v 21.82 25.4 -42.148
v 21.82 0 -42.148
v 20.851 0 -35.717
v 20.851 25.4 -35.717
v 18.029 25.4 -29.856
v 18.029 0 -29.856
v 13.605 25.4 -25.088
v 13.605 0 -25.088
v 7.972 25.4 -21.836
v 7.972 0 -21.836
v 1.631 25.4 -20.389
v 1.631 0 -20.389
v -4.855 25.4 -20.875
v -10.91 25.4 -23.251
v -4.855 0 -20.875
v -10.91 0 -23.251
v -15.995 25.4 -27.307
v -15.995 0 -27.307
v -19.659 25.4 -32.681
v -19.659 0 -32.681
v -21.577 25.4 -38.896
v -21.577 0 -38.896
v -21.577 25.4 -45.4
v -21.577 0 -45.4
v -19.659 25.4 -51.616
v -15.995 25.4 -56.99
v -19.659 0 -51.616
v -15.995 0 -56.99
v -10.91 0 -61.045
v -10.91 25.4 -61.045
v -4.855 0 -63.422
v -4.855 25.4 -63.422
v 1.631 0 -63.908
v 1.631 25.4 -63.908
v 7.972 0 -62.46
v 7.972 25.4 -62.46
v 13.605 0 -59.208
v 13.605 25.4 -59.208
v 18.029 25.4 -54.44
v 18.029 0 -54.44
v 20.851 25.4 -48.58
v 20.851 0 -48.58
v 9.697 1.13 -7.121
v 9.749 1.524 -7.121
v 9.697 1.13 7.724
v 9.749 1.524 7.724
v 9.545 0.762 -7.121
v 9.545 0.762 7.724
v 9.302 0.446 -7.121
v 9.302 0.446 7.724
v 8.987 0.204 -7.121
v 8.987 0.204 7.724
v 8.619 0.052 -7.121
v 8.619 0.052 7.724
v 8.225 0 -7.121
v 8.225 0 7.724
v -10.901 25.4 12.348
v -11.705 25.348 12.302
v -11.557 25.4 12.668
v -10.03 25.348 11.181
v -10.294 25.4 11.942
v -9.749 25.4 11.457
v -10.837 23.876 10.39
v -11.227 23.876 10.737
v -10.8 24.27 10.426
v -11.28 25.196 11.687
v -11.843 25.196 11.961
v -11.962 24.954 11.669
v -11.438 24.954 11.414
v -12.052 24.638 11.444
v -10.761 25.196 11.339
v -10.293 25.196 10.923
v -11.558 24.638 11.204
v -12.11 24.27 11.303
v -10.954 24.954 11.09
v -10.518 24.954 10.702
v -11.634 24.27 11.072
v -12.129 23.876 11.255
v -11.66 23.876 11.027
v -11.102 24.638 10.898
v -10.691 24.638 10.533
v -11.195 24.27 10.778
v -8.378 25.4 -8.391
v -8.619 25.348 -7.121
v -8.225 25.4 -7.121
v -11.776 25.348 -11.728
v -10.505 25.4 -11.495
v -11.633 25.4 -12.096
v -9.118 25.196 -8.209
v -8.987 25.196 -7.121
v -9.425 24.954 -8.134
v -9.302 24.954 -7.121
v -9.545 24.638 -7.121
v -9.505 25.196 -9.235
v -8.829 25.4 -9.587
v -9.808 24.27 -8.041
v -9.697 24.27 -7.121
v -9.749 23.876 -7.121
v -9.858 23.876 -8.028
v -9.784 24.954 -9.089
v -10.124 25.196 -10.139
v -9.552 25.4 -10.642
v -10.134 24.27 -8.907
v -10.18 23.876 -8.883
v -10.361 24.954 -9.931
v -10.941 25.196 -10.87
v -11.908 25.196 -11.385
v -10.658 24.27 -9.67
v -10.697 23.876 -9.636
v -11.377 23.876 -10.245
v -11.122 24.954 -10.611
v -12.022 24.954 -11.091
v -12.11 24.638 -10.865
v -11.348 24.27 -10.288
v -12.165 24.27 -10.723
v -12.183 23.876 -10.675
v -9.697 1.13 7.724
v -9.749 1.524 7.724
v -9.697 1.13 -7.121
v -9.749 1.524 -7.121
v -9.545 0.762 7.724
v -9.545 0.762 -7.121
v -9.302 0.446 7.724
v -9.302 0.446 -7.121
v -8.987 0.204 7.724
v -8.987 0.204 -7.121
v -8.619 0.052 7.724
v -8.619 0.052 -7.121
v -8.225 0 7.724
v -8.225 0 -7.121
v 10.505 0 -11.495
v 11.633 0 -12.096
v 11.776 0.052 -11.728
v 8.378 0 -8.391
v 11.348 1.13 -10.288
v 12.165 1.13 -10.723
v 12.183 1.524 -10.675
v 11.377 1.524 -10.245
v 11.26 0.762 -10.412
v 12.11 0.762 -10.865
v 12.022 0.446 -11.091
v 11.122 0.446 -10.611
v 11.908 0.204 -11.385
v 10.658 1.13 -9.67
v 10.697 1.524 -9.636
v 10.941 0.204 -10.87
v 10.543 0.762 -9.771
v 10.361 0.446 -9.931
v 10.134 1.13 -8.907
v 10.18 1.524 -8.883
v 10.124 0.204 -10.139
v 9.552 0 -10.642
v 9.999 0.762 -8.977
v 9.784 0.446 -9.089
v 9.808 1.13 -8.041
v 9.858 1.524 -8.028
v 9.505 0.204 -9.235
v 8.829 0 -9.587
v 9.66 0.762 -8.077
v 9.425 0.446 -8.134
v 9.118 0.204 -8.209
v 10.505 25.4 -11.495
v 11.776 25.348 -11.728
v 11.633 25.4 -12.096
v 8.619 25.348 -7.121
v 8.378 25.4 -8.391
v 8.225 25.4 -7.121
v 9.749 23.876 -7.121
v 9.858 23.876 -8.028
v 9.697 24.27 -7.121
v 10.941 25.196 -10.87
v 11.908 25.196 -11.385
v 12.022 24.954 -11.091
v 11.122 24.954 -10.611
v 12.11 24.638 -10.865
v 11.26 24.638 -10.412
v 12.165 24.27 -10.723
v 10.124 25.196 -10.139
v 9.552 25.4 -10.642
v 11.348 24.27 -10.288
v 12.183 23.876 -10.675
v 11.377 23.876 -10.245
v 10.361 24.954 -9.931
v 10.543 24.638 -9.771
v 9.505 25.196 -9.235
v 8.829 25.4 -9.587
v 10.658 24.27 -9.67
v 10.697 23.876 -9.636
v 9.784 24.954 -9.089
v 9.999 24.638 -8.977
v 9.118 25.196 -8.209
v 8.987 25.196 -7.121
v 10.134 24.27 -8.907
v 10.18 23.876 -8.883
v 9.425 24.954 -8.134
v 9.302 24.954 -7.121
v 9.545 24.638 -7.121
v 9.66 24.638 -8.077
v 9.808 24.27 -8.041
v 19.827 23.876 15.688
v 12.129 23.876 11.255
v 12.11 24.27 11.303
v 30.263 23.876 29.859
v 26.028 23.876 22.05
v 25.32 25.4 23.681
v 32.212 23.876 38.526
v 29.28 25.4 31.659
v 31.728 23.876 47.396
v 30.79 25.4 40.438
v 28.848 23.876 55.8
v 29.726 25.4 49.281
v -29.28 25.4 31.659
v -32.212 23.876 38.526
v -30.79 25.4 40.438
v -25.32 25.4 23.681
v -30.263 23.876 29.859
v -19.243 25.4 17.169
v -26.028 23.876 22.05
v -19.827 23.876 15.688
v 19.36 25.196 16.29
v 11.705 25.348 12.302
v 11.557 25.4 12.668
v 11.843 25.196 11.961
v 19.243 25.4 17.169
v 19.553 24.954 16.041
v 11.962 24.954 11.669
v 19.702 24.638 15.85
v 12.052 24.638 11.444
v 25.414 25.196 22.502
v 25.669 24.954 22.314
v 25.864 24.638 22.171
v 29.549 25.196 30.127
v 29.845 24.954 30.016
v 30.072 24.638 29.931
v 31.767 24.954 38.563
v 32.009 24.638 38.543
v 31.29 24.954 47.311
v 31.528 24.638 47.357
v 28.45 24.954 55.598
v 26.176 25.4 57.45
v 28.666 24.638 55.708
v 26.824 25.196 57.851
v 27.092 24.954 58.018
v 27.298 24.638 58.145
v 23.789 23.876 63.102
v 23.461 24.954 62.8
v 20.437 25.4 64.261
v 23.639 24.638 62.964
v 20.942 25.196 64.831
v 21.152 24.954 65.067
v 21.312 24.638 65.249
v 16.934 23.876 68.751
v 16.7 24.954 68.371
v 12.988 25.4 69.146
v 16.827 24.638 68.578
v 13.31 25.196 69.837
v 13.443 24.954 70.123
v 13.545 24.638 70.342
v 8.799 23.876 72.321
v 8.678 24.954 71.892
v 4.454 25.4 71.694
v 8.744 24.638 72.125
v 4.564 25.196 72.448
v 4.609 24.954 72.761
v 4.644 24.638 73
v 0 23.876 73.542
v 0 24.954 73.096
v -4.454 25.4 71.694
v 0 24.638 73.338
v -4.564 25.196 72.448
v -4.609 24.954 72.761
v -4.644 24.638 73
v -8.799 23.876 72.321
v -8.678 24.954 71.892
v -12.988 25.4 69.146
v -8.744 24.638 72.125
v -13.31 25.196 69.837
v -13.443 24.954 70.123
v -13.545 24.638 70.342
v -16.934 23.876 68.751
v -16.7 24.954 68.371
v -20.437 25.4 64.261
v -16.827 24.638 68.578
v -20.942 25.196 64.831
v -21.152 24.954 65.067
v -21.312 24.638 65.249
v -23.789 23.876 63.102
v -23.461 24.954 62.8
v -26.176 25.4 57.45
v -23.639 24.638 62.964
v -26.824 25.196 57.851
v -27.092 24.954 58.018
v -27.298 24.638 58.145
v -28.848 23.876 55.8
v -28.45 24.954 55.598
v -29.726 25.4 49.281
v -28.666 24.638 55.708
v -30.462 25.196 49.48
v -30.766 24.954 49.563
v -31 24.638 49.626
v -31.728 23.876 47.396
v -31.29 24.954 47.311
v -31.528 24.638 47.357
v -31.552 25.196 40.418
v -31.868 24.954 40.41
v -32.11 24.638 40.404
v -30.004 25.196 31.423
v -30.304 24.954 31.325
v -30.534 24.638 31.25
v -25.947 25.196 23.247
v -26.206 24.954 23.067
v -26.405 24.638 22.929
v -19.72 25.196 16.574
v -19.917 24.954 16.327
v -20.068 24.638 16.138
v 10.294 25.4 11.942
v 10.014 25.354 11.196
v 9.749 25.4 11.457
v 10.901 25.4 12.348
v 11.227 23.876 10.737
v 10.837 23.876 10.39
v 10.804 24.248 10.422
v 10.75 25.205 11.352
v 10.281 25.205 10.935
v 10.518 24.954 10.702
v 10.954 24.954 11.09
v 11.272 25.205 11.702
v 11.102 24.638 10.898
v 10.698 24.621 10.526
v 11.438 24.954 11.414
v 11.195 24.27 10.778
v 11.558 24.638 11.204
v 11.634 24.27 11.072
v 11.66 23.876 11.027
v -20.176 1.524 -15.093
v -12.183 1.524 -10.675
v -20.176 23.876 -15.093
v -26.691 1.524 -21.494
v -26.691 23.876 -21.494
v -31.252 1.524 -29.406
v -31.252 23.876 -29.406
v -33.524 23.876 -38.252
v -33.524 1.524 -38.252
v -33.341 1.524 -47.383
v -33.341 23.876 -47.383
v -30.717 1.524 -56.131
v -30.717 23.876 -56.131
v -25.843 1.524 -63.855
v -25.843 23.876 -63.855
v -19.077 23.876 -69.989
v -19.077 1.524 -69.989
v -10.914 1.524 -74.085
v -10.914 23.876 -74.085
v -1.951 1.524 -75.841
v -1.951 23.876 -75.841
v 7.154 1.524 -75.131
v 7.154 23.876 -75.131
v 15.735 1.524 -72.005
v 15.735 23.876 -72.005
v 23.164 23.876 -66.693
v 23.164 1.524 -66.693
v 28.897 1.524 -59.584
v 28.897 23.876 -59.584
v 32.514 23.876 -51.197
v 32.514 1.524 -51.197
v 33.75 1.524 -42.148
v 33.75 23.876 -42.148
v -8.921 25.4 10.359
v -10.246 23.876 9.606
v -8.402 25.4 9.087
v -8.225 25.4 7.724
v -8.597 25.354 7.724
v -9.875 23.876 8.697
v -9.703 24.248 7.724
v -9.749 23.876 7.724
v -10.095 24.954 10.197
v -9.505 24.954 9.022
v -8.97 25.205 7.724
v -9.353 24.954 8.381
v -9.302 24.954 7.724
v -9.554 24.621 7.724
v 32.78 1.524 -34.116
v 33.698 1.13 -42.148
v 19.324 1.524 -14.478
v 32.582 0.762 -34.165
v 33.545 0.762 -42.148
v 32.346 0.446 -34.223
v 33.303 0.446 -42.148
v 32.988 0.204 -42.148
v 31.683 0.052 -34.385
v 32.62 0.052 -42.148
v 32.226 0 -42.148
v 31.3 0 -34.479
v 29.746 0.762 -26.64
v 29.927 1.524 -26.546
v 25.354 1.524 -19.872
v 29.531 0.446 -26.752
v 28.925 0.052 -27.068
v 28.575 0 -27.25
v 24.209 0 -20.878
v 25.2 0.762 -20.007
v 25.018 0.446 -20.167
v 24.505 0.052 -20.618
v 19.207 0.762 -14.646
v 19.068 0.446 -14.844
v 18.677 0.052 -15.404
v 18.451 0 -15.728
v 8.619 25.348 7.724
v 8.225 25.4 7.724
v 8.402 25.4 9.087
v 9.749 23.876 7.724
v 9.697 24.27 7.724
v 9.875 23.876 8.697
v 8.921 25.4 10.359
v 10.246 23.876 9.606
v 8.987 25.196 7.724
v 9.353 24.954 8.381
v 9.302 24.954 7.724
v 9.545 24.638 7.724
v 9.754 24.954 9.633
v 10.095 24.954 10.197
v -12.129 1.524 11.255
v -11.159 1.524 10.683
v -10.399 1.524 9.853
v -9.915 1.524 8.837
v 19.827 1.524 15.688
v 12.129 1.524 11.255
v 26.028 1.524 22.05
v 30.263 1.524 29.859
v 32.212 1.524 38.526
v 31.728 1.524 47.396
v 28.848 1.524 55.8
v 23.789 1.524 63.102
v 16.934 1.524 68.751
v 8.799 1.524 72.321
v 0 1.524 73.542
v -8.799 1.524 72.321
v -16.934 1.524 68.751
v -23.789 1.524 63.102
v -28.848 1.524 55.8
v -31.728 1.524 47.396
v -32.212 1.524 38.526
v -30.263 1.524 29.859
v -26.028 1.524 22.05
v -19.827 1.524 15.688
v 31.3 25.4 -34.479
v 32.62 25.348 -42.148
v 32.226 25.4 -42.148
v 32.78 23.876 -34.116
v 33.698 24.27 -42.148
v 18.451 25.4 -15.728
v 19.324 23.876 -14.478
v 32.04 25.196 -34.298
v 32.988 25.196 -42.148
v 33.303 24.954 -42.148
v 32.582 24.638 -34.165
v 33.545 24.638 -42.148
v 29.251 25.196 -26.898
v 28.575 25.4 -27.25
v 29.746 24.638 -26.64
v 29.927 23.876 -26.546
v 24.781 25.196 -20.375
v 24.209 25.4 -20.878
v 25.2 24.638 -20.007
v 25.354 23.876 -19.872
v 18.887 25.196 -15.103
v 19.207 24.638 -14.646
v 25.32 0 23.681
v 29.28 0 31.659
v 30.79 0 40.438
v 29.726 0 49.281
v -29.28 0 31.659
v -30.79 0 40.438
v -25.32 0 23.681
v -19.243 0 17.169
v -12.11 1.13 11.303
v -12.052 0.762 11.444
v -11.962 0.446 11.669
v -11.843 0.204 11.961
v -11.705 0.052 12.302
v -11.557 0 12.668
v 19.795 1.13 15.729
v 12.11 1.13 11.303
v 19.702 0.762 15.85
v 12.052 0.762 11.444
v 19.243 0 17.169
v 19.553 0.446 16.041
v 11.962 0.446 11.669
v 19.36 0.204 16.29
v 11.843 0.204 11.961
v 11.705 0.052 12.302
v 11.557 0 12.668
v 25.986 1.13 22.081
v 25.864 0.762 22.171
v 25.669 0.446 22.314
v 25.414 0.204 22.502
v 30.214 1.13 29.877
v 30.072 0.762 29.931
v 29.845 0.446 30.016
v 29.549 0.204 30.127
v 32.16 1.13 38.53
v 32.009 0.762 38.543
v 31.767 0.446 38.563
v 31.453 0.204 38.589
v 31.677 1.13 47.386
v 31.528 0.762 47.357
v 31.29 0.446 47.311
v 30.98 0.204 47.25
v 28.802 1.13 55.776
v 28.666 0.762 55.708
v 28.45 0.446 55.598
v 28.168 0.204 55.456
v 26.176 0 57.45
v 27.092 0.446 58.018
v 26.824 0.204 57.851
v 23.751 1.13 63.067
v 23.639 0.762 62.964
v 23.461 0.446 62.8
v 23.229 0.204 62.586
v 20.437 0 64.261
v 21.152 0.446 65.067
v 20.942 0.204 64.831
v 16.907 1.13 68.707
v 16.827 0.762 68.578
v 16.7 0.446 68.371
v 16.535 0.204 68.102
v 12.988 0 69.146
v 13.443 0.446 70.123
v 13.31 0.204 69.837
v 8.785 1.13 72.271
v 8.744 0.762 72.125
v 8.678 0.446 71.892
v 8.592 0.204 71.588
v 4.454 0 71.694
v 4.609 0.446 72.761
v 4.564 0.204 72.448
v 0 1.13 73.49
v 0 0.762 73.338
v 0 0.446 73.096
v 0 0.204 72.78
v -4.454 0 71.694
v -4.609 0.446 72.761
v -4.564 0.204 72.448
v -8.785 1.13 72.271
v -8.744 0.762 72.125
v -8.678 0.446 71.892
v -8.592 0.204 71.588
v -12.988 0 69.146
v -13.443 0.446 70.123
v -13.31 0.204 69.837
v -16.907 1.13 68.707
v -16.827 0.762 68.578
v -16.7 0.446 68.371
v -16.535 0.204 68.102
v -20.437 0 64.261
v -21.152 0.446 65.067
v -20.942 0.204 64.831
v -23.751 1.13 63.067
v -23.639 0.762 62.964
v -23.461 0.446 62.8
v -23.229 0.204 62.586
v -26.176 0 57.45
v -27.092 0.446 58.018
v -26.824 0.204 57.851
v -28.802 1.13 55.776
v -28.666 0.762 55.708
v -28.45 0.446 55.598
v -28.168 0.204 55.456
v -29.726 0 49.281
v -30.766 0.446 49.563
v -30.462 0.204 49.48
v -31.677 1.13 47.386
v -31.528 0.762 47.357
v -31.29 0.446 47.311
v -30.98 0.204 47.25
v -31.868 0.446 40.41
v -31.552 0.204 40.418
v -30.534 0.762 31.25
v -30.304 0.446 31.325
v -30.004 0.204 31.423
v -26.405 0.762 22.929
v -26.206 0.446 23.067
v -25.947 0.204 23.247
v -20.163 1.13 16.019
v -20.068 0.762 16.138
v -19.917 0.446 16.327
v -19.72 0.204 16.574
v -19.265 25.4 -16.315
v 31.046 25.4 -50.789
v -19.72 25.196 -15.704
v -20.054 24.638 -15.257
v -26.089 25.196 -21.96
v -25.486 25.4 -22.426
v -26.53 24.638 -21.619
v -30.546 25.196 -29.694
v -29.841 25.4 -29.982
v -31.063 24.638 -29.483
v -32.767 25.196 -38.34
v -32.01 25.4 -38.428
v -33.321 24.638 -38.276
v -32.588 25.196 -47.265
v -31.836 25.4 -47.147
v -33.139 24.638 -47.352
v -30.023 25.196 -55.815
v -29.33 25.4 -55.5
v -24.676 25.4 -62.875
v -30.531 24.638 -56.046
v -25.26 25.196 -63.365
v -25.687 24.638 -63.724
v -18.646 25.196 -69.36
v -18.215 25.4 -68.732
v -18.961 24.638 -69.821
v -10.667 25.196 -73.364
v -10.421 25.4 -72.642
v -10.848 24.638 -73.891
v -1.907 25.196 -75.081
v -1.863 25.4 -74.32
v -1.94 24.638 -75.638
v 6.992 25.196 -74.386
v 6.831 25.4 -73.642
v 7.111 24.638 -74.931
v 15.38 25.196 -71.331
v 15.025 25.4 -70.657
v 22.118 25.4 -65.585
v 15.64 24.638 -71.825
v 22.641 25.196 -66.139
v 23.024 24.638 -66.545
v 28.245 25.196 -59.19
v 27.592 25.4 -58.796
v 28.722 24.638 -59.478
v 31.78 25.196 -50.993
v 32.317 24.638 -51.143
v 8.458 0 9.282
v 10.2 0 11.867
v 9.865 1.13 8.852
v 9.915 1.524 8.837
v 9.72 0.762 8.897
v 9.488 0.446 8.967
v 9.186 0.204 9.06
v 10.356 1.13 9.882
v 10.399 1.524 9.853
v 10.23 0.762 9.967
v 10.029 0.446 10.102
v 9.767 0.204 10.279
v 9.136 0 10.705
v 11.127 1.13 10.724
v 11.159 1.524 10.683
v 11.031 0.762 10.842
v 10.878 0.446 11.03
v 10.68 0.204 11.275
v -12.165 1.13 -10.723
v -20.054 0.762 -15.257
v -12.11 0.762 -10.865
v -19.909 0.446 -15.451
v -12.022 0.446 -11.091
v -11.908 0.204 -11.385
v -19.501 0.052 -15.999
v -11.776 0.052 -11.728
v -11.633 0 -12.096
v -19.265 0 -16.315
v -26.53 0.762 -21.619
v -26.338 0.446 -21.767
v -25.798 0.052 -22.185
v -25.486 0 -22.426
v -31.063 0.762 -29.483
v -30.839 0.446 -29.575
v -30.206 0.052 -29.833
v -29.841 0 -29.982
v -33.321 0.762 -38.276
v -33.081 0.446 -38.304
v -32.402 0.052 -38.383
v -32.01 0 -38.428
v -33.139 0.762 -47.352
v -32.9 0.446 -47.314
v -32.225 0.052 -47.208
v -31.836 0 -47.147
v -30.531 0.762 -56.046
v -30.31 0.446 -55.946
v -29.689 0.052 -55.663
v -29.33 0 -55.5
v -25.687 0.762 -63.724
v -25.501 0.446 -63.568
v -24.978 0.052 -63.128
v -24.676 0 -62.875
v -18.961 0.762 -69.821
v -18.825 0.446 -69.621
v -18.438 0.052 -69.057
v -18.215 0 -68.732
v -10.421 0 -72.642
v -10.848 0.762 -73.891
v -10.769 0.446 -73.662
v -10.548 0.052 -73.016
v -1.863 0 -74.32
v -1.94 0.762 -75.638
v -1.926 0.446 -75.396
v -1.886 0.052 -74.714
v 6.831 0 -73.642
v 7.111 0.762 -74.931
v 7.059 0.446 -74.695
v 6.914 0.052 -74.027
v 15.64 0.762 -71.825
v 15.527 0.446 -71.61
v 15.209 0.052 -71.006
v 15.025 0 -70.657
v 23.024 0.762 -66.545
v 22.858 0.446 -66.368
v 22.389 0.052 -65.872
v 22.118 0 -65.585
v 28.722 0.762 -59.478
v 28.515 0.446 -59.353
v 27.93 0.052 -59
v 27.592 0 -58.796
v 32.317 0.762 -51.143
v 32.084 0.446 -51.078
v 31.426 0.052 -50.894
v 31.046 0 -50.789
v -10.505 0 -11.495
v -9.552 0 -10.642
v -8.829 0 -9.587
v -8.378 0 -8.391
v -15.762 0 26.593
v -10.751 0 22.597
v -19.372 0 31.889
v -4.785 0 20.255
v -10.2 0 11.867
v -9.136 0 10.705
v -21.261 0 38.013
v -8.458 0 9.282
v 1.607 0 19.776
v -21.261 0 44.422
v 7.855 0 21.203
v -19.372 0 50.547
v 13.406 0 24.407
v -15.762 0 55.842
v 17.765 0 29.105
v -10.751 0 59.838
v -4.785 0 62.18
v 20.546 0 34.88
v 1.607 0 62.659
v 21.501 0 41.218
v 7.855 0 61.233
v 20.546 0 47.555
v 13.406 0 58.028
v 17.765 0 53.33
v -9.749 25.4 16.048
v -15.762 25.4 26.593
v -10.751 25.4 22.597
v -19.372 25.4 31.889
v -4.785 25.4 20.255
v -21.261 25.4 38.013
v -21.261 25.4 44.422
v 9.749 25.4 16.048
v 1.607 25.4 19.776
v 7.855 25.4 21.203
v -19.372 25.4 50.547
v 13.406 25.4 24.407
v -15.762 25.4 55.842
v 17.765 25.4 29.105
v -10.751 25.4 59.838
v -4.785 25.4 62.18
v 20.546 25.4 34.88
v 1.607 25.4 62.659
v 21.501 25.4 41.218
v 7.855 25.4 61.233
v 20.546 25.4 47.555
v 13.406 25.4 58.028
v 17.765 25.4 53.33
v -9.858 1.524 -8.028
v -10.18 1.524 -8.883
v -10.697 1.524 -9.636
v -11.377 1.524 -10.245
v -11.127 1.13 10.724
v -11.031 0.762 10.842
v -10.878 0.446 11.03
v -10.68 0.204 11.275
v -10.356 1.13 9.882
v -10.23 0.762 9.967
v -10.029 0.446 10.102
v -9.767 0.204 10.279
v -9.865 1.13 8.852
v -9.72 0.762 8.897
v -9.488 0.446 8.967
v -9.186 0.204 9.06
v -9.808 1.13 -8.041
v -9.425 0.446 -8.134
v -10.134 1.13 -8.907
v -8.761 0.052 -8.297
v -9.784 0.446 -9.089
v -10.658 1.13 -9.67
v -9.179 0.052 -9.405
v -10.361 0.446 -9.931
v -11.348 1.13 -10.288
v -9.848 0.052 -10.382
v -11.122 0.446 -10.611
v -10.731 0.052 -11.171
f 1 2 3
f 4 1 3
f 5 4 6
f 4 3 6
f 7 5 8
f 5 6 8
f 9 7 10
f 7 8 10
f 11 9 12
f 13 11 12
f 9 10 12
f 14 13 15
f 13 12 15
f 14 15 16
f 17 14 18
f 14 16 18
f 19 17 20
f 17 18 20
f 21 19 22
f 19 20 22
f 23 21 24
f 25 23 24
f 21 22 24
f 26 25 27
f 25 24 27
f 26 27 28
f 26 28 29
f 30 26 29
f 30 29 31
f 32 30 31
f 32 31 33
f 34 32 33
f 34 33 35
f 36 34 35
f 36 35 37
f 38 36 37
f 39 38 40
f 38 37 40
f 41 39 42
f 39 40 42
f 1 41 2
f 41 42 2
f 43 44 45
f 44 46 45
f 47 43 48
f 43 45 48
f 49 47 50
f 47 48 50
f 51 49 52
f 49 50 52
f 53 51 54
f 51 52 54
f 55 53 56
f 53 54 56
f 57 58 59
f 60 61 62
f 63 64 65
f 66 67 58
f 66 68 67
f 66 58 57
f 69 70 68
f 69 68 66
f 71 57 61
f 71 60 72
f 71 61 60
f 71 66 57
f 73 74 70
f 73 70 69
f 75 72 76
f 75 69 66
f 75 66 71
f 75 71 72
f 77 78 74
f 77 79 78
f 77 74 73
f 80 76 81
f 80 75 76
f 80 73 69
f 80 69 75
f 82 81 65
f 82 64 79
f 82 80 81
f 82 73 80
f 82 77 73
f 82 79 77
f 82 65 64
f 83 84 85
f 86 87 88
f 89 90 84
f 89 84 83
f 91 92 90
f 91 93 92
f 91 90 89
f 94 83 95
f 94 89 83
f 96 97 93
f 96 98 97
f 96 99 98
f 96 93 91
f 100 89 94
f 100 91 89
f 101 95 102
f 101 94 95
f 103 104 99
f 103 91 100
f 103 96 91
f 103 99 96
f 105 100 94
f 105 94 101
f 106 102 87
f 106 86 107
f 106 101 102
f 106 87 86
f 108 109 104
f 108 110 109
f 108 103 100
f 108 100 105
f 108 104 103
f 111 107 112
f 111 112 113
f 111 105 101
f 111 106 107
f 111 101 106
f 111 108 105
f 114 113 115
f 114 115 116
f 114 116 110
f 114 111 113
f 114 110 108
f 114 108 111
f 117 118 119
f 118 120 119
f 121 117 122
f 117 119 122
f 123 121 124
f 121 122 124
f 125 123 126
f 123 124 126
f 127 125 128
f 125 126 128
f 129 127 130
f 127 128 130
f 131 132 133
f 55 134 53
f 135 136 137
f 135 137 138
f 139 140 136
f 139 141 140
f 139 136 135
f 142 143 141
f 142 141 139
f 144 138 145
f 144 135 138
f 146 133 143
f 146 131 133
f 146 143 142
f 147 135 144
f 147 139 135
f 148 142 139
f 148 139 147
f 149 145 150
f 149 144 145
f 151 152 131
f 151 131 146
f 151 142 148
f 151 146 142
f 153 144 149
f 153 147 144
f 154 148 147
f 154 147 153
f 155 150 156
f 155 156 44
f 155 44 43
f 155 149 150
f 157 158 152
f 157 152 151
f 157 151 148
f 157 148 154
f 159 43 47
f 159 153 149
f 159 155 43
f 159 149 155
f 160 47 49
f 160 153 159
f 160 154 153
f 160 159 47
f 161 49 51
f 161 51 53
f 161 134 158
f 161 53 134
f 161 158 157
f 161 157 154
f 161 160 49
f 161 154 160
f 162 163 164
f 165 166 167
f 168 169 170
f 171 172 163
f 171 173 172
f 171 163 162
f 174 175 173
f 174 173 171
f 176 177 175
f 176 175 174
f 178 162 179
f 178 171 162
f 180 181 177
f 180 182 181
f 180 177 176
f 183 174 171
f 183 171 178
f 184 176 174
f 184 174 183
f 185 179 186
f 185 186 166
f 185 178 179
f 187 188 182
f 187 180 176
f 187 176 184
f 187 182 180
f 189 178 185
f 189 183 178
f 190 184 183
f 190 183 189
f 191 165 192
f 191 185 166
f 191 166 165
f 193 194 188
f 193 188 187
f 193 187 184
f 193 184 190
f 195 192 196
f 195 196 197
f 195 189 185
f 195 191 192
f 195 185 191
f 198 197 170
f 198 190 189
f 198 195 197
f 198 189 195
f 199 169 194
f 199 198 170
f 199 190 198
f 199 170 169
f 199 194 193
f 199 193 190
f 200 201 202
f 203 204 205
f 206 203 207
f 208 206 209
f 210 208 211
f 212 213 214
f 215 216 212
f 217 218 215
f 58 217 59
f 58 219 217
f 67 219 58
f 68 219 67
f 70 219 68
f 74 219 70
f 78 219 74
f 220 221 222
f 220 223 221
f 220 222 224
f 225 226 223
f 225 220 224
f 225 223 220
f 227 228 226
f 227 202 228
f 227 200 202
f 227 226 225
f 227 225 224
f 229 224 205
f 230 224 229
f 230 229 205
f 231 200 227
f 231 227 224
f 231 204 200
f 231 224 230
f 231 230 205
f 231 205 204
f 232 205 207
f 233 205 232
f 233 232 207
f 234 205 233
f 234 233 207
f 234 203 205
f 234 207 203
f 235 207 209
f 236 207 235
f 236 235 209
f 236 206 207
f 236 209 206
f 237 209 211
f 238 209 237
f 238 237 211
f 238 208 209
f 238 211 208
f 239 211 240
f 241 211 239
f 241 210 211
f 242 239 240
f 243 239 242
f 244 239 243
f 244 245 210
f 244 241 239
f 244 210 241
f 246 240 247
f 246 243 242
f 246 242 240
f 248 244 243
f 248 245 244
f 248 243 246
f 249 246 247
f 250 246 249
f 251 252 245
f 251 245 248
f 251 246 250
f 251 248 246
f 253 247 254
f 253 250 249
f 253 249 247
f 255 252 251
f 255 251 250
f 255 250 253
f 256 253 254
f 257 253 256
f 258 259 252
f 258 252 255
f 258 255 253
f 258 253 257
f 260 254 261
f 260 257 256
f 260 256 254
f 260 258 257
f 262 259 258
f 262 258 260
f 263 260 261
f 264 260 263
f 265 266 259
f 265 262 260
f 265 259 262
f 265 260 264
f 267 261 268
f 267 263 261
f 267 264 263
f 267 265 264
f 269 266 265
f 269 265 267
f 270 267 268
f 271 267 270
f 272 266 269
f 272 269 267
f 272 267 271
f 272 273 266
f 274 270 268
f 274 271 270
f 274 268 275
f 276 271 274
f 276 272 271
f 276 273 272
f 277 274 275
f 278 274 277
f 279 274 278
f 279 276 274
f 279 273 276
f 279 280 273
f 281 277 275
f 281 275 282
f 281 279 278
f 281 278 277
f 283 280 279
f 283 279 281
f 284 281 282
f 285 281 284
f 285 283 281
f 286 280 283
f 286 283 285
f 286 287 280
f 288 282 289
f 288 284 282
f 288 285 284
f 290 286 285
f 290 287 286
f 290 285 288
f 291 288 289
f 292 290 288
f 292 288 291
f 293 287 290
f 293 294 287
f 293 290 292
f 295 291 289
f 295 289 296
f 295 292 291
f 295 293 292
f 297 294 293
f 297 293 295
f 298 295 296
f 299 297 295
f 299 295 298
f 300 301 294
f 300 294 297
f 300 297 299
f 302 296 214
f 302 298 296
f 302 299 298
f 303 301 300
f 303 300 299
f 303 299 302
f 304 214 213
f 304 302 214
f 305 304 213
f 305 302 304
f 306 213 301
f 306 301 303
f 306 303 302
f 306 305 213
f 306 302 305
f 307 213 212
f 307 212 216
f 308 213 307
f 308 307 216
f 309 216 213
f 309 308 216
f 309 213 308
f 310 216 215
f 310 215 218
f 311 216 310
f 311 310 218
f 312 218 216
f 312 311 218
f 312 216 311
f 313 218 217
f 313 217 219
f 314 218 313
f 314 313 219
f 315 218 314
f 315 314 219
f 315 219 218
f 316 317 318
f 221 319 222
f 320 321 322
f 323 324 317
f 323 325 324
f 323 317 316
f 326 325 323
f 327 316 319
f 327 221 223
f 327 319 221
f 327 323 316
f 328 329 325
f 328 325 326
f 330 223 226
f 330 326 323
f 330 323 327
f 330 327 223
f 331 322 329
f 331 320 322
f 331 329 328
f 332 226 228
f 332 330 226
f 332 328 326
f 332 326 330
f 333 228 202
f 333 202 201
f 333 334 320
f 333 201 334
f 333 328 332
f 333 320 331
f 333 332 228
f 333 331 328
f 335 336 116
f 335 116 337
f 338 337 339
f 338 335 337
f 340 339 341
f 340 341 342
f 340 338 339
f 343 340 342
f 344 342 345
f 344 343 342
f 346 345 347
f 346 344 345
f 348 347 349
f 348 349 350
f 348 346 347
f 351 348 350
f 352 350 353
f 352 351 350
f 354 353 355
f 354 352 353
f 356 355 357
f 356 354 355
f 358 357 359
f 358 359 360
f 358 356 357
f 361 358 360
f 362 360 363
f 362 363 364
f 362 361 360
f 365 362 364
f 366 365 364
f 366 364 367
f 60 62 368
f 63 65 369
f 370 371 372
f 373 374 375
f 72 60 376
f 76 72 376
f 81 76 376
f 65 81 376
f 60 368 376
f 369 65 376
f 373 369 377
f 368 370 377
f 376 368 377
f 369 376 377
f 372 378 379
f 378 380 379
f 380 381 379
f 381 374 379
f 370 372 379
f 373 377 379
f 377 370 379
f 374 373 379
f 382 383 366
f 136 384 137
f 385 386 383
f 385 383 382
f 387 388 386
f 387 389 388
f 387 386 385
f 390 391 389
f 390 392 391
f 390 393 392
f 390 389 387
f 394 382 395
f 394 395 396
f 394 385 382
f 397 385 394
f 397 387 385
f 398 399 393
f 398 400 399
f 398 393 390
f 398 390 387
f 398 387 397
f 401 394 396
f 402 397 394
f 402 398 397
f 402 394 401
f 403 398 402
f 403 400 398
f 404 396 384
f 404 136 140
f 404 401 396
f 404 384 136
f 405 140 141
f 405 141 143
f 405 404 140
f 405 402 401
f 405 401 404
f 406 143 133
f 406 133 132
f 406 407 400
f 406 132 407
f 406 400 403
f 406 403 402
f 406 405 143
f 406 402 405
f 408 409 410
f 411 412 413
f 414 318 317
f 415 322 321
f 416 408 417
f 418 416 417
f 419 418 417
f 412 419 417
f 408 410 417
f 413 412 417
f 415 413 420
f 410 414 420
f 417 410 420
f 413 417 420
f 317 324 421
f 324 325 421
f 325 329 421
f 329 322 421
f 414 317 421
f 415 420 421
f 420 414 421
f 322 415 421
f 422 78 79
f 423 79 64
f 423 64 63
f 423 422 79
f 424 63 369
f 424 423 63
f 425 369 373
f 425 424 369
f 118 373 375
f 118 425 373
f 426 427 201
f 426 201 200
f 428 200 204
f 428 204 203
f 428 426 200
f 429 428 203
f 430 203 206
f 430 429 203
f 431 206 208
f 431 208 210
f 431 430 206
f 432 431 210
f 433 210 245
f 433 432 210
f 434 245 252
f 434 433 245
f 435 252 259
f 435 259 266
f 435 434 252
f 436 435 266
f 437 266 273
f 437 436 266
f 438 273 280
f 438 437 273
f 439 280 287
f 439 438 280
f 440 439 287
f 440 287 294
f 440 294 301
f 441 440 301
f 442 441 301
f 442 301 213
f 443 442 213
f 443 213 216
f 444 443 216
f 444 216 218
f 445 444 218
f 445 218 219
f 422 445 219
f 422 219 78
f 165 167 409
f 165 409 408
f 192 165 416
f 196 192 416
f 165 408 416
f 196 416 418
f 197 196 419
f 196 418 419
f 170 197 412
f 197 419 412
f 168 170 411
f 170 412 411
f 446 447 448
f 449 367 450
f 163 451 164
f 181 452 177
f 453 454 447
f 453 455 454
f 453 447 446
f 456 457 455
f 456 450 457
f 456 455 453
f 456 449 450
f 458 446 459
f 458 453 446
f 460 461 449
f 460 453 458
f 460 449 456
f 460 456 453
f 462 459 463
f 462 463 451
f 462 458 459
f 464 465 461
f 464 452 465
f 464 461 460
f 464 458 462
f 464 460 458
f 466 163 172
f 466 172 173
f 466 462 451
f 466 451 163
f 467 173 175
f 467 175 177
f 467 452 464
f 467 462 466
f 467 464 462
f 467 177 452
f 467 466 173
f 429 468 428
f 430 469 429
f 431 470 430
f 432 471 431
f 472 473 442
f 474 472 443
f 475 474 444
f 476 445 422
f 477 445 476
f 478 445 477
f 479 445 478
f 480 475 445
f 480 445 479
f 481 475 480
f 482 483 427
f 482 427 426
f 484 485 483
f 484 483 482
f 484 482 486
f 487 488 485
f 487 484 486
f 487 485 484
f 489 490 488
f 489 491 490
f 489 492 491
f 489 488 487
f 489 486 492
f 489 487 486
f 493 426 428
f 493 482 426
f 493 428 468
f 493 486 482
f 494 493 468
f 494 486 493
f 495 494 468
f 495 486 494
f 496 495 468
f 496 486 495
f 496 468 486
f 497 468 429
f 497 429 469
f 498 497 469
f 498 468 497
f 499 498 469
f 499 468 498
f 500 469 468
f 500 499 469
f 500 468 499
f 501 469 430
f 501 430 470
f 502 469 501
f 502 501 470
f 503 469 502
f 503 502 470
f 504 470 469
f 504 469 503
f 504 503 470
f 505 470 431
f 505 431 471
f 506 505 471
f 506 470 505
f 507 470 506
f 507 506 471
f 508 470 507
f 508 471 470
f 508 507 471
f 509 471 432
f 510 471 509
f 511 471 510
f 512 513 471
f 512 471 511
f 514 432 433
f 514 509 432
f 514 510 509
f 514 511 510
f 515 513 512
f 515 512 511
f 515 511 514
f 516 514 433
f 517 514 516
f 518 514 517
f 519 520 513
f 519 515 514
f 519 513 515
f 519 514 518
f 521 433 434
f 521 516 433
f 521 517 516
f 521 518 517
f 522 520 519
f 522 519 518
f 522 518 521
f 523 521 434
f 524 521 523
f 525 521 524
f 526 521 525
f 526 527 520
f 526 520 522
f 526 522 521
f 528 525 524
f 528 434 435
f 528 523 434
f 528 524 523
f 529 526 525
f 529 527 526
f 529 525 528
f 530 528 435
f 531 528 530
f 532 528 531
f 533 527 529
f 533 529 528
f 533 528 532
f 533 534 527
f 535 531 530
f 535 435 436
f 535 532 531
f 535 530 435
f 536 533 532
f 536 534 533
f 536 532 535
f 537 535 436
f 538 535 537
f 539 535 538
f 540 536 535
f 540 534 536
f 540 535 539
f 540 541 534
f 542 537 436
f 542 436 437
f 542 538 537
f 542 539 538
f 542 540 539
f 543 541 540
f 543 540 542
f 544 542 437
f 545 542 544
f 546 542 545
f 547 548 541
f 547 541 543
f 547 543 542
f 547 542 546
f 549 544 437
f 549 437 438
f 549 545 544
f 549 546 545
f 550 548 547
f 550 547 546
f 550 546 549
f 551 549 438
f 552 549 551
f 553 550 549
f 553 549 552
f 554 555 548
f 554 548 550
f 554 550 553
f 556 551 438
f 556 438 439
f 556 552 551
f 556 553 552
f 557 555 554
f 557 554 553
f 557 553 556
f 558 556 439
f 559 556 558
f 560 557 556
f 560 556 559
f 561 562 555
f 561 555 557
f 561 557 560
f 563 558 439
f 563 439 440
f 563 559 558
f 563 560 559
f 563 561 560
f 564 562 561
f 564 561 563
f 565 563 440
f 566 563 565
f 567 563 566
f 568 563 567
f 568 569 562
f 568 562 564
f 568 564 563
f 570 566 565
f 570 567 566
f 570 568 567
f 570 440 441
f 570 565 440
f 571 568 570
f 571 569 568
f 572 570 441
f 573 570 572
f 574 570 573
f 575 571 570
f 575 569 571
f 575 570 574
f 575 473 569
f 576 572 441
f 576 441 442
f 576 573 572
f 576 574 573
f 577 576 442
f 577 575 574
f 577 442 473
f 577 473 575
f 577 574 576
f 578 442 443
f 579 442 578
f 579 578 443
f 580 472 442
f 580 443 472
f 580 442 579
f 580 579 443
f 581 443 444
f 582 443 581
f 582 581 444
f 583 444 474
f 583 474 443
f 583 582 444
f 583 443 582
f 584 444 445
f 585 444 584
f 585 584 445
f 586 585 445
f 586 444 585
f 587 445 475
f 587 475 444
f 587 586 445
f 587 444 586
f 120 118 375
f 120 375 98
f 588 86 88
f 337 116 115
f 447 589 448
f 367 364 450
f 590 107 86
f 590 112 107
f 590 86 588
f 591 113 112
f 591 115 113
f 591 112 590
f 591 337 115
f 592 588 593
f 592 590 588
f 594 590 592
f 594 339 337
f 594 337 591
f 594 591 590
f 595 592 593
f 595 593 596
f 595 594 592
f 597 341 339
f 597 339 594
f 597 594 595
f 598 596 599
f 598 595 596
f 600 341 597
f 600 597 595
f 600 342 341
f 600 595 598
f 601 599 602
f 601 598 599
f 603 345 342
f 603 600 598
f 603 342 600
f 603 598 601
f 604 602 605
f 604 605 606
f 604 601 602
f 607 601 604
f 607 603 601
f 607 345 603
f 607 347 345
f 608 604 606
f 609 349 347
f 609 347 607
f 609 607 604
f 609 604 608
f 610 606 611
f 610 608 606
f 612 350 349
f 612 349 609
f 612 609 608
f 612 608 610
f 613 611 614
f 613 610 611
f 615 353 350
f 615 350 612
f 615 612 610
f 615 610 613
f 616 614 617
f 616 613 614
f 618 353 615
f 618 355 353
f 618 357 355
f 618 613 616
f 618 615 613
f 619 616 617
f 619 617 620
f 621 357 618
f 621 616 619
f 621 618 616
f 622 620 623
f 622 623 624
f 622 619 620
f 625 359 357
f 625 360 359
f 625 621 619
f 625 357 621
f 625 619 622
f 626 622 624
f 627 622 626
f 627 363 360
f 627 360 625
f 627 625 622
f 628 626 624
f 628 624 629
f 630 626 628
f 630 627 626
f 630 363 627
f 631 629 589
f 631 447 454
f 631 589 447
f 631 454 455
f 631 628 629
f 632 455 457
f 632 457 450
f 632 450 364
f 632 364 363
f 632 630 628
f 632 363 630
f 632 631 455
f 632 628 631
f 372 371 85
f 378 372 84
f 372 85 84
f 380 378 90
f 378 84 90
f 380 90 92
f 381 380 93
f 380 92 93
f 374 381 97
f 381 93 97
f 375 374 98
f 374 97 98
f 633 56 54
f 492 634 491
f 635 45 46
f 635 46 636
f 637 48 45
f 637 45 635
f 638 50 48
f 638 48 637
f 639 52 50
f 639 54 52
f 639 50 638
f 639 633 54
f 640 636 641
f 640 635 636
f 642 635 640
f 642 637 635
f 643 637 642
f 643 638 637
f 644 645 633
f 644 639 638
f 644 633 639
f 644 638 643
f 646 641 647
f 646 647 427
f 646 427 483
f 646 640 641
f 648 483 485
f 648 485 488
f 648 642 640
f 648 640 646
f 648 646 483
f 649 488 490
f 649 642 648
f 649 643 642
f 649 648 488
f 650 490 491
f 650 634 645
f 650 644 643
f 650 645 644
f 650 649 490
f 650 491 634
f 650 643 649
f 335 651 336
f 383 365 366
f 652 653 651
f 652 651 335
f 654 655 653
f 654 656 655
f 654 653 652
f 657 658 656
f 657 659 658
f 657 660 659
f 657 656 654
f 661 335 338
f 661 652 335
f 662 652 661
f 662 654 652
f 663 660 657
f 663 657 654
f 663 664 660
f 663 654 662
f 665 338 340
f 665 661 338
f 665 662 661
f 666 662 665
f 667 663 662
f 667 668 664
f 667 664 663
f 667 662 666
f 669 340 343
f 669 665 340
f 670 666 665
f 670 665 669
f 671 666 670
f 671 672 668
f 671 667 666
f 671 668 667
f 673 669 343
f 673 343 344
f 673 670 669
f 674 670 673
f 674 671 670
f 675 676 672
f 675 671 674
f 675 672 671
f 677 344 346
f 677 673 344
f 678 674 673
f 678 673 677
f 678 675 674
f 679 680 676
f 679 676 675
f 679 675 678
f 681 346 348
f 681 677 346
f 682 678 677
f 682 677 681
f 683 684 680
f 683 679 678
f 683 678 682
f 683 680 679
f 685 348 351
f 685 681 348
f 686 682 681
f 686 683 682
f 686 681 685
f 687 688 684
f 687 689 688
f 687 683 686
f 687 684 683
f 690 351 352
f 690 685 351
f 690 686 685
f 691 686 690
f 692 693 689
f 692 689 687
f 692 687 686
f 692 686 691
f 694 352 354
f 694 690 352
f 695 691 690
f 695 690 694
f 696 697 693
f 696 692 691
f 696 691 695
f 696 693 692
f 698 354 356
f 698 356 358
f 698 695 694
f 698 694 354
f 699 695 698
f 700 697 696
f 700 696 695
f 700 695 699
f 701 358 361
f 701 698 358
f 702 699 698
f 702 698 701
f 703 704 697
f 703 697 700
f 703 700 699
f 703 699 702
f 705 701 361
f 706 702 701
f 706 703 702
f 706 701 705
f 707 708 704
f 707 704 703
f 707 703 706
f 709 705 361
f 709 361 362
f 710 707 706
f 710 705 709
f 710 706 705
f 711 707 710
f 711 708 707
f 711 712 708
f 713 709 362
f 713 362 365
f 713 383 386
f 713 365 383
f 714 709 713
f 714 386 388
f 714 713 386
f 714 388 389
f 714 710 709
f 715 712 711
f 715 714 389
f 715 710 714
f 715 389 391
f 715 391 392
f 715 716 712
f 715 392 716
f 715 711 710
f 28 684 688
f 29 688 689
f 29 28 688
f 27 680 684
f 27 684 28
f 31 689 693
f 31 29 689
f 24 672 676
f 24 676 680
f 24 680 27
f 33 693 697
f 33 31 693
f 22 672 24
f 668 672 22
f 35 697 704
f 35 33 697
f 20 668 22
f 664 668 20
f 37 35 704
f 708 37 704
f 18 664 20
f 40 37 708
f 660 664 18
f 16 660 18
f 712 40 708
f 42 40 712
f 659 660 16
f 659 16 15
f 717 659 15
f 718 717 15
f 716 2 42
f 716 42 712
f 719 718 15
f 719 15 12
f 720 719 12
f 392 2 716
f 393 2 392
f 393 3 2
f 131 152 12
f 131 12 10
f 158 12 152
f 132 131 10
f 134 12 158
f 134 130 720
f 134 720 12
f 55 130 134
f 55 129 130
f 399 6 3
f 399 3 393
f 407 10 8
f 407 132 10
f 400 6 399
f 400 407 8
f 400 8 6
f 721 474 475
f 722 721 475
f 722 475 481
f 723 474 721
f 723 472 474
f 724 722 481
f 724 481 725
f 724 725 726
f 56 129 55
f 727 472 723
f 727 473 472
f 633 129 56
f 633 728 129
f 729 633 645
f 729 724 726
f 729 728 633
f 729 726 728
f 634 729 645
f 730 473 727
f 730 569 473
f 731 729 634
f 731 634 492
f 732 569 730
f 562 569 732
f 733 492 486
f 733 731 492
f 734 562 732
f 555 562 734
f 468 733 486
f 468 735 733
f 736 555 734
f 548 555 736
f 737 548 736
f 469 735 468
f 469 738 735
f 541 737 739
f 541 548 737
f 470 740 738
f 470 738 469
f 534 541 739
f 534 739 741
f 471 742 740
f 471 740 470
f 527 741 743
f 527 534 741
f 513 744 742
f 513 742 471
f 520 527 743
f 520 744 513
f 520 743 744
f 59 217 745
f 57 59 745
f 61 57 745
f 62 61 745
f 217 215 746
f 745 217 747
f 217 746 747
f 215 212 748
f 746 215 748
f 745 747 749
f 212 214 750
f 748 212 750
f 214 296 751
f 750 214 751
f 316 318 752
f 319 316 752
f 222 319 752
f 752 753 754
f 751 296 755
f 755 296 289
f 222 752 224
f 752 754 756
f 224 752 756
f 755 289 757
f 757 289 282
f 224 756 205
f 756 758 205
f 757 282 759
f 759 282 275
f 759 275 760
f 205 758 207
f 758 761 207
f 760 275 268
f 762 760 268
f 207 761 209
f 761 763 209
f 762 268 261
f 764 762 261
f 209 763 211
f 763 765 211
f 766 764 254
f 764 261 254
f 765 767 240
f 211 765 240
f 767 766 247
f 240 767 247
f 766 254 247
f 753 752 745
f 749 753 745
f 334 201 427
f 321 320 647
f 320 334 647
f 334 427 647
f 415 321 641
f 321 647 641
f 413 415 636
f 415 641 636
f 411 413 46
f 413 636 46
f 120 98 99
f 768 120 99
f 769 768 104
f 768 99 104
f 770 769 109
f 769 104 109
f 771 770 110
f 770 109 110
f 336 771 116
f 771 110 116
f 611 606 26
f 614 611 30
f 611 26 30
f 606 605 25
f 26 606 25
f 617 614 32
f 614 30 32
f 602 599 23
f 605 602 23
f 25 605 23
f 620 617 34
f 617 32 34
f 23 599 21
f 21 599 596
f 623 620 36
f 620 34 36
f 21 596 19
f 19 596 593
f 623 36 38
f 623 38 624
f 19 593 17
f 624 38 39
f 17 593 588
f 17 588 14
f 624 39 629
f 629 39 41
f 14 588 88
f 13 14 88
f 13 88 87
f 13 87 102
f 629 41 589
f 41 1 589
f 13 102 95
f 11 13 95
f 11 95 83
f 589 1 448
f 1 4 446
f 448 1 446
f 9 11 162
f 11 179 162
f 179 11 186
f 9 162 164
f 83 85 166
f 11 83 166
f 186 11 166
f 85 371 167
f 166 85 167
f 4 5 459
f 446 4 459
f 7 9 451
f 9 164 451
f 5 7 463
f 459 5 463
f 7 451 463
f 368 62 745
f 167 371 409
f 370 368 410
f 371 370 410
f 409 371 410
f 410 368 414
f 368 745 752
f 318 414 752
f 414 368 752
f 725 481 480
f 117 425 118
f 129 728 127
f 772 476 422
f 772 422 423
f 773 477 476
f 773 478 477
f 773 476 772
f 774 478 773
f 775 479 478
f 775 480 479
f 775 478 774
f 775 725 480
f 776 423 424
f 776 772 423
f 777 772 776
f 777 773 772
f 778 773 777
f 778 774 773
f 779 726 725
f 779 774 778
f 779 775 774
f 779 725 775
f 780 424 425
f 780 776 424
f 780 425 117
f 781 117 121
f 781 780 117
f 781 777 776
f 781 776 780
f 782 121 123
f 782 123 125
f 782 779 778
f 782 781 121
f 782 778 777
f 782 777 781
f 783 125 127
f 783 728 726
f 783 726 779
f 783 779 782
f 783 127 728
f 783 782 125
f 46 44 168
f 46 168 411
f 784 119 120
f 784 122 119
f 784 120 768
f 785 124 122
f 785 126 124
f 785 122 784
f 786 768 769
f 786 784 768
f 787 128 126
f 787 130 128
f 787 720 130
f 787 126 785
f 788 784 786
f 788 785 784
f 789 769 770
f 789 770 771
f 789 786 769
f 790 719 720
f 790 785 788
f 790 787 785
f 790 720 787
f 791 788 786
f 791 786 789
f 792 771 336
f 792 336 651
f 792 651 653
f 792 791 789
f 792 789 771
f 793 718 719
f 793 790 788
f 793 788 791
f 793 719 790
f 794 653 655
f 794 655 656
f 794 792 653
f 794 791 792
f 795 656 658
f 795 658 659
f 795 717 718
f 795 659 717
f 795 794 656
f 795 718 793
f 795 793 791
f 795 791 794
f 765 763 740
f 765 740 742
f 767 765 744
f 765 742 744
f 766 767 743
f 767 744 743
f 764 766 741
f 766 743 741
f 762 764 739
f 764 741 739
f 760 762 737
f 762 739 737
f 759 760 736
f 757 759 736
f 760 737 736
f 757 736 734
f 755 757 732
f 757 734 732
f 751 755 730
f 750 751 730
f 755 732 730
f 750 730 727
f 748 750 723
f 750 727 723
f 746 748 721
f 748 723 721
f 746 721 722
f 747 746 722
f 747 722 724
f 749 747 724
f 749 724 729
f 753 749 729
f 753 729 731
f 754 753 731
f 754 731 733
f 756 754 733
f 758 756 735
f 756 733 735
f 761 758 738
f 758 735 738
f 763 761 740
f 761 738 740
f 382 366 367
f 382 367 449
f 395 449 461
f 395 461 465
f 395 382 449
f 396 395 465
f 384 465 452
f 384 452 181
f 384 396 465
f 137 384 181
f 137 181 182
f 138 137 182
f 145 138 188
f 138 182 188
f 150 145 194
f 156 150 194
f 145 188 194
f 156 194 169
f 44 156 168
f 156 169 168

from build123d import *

# Parameters (mm, degrees)
F2_R     = 21.8203360692
F3_DEPTH = 25.4
F4_R     = 32.3243741503
F4_R_2   = 21.5014025506
F5_DEPTH = 25.399999693
F6_R     = 3.81
F8_R     = 1.524


with BuildPart() as f3:
    # F2 (on face) → F3 (new body)
    with BuildSketch(Plane.XZ):
        with BuildLine():
            ThreePointArc((33.7495873612, -42.148321867), (27.0928879745, -22.0234599232), (9.7486972809, -9.8373709621))
            Line((9.7486972809, -9.8373709621), (9.7486972809, -16.04783535))
            Line((9.7486972809, -16.04783535), (-9.7486972809, -16.04783535))
            Line((-9.7486972809, -16.04783535), (-9.7486972809, -9.8373709621))
            ThreePointArc((-9.7486972809, -9.8373709621), (-20.1248619438, -69.2412098414), (33.7495873612, -42.148321867))
        make_face()
        with Locations((0, -42.148321867)):
            Circle(F2_R, mode=Mode.SUBTRACT)
        with BuildLine():
            Line((9.7486972809, -9.8373709621), (9.7486972809, 16.04783535))
            Line((9.7486972809, 16.04783535), (-9.7486972809, 16.04783535))
            Line((-9.7486972809, 16.04783535), (-9.7486972809, -9.8373709621))
            ThreePointArc((-9.7486972809, -9.8373709621), (0, -8.3987345058), (9.7486972809, -9.8373709621))
        make_face()
        with BuildLine():
            Line((9.7486972809, -16.04783535), (9.7486972809, -9.8373709621))
            ThreePointArc((9.7486972809, -9.8373709621), (0, -8.3987345058), (-9.7486972809, -9.8373709621))
            Line((-9.7486972809, -9.8373709621), (-9.7486972809, -16.04783535))
            Line((-9.7486972809, -16.04783535), (9.7486972809, -16.04783535))
        make_face()
    extrude(amount=-F3_DEPTH)

    # F4 (on Front) → F5 (join)
    with BuildSketch(Plane.XZ):
        with Locations((0, 41.2176400423)):
            Circle(F4_R)
        with Locations((0, 41.2176400423)):
            Circle(F4_R_2, mode=Mode.SUBTRACT)
    extrude(amount=-F5_DEPTH)

    # F6
    f6_edges = [f3.edges().sort_by_distance(p)[0] for p in [
        (-9.748697, 12.7, -9.837371),
        (-9.748697, 12.7, 10.398359),
        (9.748697, 12.7, 10.398359),
        (9.748697, 12.7, -9.837371),
    ]]
    fillet(f6_edges, radius=F6_R)

    # F8
    f8_edges = [f3.edges().sort_by_distance(p)[0] for p in [
        (0, 0, -75.897909),
        (-12.183319, 12.7, -10.674501),
        (12.183319, 12.7, -10.674501),
        (0, 25.4, -75.897909),
        (10.415746, 0, -9.275004),
        (9.748697, 12.7, -7.121413),
        (10.415746, 25.4, -9.275004),
        (-10.415746, 0, -9.275004),
        (-9.748697, 12.7, -7.121413),
        (-10.415746, 25.4, -9.275004),
        (10.399348, 25.4, 9.853003),
        (12.129071, 12.7, 11.25515),
        (9.748697, 12.7, 7.72354),
        (10.399348, 0, 9.853003),
        (0, 0, 73.542014),
        (-12.129071, 12.7, 11.25515),
        (0, 25.4, 73.542014),
        (-10.399348, 25.4, 9.853003),
        (-9.748697, 12.7, 7.72354),
        (-10.399348, 0, 9.853003),
    ]]
    fillet(f8_edges, radius=F8_R)


solid = f3.part
